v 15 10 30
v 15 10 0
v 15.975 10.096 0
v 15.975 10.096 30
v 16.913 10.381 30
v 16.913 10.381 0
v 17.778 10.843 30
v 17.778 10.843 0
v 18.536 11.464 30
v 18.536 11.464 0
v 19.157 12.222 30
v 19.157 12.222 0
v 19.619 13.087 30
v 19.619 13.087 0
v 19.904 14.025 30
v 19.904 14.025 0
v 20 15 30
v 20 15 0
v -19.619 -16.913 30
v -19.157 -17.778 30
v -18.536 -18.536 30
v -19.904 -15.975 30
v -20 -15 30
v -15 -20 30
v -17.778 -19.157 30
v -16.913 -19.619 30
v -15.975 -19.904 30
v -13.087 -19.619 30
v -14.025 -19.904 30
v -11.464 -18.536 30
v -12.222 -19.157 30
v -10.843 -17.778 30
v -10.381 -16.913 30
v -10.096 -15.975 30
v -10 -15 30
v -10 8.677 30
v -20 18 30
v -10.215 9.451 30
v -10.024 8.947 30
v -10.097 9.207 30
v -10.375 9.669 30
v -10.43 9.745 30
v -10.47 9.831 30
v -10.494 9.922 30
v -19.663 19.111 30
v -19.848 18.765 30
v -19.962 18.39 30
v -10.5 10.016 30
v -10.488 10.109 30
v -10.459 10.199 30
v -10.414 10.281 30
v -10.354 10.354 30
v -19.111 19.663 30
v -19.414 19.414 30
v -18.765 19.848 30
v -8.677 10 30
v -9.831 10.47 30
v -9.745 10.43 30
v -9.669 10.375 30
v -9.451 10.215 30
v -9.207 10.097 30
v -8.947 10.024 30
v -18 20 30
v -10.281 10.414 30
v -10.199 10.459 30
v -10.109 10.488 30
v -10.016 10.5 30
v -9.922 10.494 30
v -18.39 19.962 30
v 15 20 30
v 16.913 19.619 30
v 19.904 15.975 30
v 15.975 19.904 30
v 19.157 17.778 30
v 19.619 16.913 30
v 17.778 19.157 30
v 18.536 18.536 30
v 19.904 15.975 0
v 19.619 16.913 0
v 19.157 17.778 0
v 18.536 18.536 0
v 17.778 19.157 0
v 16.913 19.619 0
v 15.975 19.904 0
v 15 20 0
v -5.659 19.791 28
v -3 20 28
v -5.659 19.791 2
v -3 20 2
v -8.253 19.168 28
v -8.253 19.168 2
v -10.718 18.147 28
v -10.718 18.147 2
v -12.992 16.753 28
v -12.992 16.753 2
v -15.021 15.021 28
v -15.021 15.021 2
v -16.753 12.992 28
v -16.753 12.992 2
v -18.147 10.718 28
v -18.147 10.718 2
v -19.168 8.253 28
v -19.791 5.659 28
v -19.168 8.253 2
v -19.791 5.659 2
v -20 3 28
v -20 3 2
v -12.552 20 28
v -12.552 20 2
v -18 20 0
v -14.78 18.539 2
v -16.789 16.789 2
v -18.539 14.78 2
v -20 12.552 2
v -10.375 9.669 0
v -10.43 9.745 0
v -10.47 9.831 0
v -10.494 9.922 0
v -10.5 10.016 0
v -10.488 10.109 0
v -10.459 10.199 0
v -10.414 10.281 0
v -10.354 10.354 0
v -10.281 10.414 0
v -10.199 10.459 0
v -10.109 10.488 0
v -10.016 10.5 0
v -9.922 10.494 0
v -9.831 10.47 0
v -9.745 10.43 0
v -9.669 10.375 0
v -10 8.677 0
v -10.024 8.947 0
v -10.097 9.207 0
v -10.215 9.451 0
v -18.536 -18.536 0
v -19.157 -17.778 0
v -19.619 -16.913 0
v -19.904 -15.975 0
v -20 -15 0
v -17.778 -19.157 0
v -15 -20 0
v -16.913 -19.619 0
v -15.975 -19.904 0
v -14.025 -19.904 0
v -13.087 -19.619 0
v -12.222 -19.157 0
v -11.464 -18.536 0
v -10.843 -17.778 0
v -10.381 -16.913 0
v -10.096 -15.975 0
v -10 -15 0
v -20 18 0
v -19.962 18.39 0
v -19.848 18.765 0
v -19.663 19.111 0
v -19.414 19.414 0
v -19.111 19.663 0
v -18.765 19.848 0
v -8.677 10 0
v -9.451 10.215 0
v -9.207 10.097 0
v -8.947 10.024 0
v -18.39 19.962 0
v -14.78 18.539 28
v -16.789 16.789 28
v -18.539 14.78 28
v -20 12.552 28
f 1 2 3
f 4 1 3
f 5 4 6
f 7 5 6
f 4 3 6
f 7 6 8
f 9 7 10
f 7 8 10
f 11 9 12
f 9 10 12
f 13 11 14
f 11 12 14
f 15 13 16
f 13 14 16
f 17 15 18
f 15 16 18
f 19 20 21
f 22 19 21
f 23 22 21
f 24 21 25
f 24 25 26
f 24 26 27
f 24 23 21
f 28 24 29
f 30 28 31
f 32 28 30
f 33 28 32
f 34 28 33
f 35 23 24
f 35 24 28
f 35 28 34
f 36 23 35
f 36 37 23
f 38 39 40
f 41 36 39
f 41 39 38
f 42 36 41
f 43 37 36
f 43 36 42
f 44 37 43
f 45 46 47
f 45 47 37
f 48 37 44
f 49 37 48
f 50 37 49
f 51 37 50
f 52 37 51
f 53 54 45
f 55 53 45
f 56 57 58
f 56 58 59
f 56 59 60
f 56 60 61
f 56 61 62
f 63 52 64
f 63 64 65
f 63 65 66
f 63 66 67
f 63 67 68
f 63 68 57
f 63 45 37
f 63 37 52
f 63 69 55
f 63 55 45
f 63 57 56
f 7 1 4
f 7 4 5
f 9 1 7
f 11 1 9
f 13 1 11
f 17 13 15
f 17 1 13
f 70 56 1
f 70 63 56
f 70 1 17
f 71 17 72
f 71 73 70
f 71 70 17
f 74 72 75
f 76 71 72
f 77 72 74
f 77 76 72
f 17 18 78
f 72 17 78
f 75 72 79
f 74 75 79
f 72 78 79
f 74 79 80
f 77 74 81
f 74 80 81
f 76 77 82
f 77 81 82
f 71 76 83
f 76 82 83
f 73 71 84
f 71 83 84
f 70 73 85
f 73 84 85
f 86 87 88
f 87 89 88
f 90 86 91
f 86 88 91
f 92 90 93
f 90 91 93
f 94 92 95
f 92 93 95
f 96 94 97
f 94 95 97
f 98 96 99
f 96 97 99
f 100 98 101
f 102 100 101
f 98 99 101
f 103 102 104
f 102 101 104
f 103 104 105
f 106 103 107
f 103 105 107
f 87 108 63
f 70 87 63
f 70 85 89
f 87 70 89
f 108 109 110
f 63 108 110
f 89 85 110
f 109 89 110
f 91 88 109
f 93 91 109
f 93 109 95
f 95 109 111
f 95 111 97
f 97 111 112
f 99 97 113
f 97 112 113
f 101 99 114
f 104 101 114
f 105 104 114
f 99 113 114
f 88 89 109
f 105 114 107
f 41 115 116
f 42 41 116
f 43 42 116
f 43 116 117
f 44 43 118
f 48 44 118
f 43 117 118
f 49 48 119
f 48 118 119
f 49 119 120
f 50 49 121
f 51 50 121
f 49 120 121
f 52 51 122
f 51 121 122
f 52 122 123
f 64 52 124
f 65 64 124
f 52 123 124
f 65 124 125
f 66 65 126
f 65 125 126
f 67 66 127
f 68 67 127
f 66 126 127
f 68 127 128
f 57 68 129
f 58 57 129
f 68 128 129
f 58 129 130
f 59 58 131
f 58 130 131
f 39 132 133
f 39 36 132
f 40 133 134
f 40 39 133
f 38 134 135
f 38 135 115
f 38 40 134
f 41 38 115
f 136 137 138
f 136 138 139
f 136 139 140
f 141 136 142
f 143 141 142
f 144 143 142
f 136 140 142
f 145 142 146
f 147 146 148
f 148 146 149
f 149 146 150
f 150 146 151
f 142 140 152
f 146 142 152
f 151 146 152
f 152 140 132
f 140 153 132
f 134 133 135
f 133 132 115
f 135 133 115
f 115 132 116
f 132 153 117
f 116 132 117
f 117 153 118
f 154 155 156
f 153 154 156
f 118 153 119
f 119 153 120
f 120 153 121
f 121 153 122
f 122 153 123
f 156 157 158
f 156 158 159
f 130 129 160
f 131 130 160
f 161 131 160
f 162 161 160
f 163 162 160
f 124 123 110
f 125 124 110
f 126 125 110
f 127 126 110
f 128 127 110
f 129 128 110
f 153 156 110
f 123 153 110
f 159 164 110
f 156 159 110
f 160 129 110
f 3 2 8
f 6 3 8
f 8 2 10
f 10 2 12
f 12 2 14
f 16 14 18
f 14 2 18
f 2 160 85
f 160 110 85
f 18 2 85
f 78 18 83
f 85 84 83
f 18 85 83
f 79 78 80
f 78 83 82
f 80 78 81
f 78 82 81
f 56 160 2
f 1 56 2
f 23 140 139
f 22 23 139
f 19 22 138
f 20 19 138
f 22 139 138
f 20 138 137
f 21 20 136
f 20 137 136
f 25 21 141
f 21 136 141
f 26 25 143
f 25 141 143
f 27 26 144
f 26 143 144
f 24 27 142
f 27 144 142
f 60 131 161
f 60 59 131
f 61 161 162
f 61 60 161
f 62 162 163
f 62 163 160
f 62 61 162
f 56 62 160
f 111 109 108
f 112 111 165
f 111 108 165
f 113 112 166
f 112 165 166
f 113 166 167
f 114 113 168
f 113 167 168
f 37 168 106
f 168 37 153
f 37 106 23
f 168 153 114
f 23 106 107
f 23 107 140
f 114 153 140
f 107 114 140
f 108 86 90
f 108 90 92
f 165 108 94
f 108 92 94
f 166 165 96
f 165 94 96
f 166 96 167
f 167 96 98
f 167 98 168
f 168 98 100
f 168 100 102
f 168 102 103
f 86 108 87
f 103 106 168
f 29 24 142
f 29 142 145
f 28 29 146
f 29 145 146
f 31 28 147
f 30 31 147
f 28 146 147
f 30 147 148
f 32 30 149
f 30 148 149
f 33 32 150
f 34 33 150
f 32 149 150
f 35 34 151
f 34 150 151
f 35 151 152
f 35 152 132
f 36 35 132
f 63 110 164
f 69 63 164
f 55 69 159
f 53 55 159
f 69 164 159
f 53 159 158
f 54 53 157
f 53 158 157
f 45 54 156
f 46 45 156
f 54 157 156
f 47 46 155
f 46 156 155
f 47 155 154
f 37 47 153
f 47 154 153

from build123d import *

# Parameters (mm, degrees)
F1_DEPTH = 30
F4_W     = 2.5
F4_H     = 26
F6_R     = 1.5


with BuildPart() as f1:
    # F0 (on Top) → F1 (new body)
    with BuildSketch(Plane.XY):
        with BuildLine():
            Line((15, 20), (-15, 20))
            Line((-15, 20), (-18, 20))
            ThreePointArc((-18, 20), (-19.414214, 19.414214), (-20, 18))
            Line((-20, 18), (-20, 15))
            Line((-20, 15), (-20, -15))
            ThreePointArc((-20, -15), (-18.535534, -18.535534), (-15, -20))
            ThreePointArc((-15, -20), (-11.464466, -18.535534), (-10, -15))
            Line((-10, -15), (-10, 9.5))
            ThreePointArc((-10, 9.5), (-10.353553, 10.353553), (-9.5, 10))
            Line((-9.5, 10), (15, 10))
            ThreePointArc((15, 10), (18.535534, 11.464466), (20, 15))
            ThreePointArc((20, 15), (18.535534, 18.535534), (15, 20))
        make_face()
    extrude(amount=F1_DEPTH)

    # F5: sweep along a path in F2
    with BuildLine(Plane.XY.offset(30)) as f5_path:
        ThreePointArc((-3, 20), (-15.020815, 15.020815), (-20, 3))
    # F4 (on face) → F5 (sweep, cut)
    with BuildSketch(Plane(origin=(0, 3, 0), x_dir=(-1, 0, 0), z_dir=(0, 1, 0))):
        with Locations((21.25, 15)):
            Rectangle(F4_W, F4_H)
    sweep(path=f5_path.line, mode=Mode.SUBTRACT)

    # F6
    f6_edges = [f1.edges().sort_by_distance(p)[0] for p in [
        (-10, 9.5, 15),
        (-9.5, 10, 15),
    ]]
    fillet(f6_edges, radius=F6_R)


solid = f1.part
